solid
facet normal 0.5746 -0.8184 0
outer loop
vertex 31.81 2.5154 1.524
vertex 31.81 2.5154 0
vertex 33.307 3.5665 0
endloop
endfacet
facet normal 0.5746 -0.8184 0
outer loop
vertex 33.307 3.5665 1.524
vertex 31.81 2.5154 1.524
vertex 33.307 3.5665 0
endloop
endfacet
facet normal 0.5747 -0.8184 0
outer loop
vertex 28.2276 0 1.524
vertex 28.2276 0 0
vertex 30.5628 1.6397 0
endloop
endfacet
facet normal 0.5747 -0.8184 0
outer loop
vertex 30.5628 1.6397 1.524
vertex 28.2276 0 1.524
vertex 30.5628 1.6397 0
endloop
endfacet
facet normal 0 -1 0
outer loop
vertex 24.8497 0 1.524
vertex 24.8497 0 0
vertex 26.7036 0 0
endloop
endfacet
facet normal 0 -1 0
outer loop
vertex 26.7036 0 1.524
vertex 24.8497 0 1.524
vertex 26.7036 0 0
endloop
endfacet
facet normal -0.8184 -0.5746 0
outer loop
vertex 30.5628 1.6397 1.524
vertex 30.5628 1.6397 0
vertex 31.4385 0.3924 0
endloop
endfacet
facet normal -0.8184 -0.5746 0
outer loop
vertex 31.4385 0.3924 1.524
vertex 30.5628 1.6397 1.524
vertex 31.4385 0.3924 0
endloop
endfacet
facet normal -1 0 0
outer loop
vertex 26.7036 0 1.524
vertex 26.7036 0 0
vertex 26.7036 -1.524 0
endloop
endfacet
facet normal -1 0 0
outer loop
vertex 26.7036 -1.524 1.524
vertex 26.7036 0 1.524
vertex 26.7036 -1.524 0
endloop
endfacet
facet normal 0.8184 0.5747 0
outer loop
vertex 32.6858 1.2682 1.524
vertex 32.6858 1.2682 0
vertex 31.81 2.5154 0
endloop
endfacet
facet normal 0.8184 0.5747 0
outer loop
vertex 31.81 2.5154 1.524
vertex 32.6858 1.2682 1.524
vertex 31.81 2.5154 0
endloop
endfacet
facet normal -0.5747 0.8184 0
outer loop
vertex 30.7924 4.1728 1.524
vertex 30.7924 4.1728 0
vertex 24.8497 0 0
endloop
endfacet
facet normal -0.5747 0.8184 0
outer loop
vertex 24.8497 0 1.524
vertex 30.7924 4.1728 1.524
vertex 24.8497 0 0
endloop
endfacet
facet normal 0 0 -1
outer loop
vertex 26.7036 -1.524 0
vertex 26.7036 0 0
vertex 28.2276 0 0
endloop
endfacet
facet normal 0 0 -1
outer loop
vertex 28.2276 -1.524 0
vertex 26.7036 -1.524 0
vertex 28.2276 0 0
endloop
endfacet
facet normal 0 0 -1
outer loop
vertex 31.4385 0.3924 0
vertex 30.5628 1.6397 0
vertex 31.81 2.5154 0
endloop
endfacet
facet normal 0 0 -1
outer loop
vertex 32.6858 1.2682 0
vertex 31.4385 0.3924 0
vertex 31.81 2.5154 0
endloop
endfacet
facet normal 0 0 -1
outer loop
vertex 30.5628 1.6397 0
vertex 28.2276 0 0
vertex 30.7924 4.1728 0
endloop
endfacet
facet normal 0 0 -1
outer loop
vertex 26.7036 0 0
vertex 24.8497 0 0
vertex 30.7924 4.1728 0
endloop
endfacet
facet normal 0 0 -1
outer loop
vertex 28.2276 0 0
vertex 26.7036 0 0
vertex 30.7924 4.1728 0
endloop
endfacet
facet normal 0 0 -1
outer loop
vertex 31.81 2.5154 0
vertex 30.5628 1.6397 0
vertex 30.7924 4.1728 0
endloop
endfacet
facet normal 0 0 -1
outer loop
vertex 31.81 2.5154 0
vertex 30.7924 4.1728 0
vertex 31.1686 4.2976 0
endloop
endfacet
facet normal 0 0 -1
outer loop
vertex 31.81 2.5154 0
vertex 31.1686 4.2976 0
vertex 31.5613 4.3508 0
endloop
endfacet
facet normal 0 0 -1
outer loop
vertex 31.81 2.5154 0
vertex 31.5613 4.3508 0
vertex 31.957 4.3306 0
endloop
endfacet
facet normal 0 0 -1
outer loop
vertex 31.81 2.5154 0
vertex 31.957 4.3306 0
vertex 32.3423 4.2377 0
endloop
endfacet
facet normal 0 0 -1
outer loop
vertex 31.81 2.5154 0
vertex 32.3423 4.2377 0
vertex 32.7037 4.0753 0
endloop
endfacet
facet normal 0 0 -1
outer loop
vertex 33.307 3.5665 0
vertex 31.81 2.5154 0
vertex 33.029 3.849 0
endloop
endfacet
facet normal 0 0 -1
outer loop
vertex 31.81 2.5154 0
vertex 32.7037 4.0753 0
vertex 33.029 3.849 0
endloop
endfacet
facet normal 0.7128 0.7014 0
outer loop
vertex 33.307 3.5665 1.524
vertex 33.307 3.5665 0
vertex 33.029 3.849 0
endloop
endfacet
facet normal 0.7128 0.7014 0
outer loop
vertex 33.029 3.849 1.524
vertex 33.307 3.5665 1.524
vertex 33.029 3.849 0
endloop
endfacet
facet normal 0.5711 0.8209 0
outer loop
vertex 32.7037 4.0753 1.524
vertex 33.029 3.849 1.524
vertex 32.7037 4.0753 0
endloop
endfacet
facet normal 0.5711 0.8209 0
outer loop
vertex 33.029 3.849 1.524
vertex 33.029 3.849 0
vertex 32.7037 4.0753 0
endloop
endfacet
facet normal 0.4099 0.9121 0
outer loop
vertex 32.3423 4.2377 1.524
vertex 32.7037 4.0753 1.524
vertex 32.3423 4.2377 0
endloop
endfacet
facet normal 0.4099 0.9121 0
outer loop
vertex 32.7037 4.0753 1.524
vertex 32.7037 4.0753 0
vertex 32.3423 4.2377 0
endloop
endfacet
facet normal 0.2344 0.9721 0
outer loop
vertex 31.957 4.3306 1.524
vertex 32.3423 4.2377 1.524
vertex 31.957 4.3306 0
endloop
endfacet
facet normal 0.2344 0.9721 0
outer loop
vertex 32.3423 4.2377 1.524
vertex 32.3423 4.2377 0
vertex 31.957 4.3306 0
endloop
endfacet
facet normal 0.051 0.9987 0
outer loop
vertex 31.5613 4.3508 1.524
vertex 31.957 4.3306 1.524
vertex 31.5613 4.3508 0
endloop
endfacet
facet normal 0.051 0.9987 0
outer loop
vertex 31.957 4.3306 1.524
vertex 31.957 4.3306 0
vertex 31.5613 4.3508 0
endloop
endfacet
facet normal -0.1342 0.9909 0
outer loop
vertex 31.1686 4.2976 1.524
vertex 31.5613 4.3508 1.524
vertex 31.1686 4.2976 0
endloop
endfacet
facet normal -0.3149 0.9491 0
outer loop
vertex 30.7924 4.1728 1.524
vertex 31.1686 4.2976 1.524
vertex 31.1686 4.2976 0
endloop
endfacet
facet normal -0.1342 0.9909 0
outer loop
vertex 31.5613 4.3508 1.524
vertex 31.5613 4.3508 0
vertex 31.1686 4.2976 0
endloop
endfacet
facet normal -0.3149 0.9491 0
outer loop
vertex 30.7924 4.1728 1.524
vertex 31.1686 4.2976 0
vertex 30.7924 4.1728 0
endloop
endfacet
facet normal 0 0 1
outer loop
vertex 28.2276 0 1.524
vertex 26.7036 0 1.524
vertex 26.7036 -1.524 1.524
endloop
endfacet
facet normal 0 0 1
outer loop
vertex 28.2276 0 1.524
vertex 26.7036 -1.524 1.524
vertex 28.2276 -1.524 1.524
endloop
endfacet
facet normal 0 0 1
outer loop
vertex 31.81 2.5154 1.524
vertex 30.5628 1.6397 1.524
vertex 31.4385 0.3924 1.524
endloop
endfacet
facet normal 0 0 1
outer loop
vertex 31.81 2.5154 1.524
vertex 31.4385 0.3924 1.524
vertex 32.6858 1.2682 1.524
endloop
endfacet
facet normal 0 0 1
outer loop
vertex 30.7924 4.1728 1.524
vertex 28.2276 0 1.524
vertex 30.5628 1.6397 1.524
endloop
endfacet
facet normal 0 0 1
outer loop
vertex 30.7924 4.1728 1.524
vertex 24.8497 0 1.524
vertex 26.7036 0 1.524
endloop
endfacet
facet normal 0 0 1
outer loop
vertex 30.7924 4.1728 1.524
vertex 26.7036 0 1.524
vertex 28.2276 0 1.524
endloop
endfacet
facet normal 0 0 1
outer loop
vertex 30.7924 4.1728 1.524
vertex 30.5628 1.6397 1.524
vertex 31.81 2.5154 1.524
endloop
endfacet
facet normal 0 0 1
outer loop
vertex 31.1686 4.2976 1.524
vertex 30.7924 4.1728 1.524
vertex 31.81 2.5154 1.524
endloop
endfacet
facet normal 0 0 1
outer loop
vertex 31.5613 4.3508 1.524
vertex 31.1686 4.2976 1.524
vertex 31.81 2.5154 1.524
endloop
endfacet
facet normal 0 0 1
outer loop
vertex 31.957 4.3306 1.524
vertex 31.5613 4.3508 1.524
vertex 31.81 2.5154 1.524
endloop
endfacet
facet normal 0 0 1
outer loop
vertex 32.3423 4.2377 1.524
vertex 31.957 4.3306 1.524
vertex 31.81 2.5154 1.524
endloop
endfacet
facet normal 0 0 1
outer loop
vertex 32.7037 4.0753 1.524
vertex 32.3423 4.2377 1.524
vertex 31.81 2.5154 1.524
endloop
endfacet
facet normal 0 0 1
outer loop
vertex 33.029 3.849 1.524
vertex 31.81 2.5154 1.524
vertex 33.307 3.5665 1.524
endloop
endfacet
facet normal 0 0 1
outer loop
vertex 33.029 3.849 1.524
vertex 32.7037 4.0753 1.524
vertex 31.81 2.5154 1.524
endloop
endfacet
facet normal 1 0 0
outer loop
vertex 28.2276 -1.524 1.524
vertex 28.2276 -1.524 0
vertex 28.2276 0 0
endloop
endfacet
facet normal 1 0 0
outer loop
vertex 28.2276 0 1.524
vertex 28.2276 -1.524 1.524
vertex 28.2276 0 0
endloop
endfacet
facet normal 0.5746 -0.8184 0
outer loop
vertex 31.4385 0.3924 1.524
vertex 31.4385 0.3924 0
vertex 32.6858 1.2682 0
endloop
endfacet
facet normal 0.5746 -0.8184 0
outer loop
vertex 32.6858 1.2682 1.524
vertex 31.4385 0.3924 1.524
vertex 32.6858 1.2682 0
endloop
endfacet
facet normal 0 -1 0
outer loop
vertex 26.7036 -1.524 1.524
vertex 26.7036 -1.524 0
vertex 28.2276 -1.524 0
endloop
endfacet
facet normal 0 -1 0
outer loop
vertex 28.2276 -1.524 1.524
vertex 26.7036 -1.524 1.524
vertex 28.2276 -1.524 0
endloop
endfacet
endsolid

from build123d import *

# Parameters (mm, degrees)
BOSS_EXTRUDE1_DEPTH = 1.524


with BuildPart() as part:
    # Sketch1 → Boss-Extrude1 (new body)
    with BuildSketch(Plane.XY):
        with BuildLine():
            Line((26.703585716, 0), (26.703585716, -1.524))
            Line((26.703585716, -1.524), (28.227585716, -1.524))
            Line((28.227585716, -1.524), (28.227585716, 0))
            Line((28.227585716, 0), (30.562754439, 1.639658569))
            Line((30.562754439, 1.639658569), (31.438516966, 0.39241521))
            Line((31.438516966, 0.39241521), (32.685760325, 1.268177737))
            Line((32.685760325, 1.268177737), (31.809997798, 2.515421096))
            Line((31.809997798, 2.515421096), (33.306965818, 3.566529915))
            ThreePointArc((33.306965818, 3.566529915), (32.151803022, 4.293127988), (30.792442306, 4.172777296))
            Line((30.792442306, 4.172777296), (24.84965689, 0))
            Line((24.84965689, 0), (26.703585716, 0))
        make_face()
    extrude(amount=BOSS_EXTRUDE1_DEPTH)


solid = part.part
